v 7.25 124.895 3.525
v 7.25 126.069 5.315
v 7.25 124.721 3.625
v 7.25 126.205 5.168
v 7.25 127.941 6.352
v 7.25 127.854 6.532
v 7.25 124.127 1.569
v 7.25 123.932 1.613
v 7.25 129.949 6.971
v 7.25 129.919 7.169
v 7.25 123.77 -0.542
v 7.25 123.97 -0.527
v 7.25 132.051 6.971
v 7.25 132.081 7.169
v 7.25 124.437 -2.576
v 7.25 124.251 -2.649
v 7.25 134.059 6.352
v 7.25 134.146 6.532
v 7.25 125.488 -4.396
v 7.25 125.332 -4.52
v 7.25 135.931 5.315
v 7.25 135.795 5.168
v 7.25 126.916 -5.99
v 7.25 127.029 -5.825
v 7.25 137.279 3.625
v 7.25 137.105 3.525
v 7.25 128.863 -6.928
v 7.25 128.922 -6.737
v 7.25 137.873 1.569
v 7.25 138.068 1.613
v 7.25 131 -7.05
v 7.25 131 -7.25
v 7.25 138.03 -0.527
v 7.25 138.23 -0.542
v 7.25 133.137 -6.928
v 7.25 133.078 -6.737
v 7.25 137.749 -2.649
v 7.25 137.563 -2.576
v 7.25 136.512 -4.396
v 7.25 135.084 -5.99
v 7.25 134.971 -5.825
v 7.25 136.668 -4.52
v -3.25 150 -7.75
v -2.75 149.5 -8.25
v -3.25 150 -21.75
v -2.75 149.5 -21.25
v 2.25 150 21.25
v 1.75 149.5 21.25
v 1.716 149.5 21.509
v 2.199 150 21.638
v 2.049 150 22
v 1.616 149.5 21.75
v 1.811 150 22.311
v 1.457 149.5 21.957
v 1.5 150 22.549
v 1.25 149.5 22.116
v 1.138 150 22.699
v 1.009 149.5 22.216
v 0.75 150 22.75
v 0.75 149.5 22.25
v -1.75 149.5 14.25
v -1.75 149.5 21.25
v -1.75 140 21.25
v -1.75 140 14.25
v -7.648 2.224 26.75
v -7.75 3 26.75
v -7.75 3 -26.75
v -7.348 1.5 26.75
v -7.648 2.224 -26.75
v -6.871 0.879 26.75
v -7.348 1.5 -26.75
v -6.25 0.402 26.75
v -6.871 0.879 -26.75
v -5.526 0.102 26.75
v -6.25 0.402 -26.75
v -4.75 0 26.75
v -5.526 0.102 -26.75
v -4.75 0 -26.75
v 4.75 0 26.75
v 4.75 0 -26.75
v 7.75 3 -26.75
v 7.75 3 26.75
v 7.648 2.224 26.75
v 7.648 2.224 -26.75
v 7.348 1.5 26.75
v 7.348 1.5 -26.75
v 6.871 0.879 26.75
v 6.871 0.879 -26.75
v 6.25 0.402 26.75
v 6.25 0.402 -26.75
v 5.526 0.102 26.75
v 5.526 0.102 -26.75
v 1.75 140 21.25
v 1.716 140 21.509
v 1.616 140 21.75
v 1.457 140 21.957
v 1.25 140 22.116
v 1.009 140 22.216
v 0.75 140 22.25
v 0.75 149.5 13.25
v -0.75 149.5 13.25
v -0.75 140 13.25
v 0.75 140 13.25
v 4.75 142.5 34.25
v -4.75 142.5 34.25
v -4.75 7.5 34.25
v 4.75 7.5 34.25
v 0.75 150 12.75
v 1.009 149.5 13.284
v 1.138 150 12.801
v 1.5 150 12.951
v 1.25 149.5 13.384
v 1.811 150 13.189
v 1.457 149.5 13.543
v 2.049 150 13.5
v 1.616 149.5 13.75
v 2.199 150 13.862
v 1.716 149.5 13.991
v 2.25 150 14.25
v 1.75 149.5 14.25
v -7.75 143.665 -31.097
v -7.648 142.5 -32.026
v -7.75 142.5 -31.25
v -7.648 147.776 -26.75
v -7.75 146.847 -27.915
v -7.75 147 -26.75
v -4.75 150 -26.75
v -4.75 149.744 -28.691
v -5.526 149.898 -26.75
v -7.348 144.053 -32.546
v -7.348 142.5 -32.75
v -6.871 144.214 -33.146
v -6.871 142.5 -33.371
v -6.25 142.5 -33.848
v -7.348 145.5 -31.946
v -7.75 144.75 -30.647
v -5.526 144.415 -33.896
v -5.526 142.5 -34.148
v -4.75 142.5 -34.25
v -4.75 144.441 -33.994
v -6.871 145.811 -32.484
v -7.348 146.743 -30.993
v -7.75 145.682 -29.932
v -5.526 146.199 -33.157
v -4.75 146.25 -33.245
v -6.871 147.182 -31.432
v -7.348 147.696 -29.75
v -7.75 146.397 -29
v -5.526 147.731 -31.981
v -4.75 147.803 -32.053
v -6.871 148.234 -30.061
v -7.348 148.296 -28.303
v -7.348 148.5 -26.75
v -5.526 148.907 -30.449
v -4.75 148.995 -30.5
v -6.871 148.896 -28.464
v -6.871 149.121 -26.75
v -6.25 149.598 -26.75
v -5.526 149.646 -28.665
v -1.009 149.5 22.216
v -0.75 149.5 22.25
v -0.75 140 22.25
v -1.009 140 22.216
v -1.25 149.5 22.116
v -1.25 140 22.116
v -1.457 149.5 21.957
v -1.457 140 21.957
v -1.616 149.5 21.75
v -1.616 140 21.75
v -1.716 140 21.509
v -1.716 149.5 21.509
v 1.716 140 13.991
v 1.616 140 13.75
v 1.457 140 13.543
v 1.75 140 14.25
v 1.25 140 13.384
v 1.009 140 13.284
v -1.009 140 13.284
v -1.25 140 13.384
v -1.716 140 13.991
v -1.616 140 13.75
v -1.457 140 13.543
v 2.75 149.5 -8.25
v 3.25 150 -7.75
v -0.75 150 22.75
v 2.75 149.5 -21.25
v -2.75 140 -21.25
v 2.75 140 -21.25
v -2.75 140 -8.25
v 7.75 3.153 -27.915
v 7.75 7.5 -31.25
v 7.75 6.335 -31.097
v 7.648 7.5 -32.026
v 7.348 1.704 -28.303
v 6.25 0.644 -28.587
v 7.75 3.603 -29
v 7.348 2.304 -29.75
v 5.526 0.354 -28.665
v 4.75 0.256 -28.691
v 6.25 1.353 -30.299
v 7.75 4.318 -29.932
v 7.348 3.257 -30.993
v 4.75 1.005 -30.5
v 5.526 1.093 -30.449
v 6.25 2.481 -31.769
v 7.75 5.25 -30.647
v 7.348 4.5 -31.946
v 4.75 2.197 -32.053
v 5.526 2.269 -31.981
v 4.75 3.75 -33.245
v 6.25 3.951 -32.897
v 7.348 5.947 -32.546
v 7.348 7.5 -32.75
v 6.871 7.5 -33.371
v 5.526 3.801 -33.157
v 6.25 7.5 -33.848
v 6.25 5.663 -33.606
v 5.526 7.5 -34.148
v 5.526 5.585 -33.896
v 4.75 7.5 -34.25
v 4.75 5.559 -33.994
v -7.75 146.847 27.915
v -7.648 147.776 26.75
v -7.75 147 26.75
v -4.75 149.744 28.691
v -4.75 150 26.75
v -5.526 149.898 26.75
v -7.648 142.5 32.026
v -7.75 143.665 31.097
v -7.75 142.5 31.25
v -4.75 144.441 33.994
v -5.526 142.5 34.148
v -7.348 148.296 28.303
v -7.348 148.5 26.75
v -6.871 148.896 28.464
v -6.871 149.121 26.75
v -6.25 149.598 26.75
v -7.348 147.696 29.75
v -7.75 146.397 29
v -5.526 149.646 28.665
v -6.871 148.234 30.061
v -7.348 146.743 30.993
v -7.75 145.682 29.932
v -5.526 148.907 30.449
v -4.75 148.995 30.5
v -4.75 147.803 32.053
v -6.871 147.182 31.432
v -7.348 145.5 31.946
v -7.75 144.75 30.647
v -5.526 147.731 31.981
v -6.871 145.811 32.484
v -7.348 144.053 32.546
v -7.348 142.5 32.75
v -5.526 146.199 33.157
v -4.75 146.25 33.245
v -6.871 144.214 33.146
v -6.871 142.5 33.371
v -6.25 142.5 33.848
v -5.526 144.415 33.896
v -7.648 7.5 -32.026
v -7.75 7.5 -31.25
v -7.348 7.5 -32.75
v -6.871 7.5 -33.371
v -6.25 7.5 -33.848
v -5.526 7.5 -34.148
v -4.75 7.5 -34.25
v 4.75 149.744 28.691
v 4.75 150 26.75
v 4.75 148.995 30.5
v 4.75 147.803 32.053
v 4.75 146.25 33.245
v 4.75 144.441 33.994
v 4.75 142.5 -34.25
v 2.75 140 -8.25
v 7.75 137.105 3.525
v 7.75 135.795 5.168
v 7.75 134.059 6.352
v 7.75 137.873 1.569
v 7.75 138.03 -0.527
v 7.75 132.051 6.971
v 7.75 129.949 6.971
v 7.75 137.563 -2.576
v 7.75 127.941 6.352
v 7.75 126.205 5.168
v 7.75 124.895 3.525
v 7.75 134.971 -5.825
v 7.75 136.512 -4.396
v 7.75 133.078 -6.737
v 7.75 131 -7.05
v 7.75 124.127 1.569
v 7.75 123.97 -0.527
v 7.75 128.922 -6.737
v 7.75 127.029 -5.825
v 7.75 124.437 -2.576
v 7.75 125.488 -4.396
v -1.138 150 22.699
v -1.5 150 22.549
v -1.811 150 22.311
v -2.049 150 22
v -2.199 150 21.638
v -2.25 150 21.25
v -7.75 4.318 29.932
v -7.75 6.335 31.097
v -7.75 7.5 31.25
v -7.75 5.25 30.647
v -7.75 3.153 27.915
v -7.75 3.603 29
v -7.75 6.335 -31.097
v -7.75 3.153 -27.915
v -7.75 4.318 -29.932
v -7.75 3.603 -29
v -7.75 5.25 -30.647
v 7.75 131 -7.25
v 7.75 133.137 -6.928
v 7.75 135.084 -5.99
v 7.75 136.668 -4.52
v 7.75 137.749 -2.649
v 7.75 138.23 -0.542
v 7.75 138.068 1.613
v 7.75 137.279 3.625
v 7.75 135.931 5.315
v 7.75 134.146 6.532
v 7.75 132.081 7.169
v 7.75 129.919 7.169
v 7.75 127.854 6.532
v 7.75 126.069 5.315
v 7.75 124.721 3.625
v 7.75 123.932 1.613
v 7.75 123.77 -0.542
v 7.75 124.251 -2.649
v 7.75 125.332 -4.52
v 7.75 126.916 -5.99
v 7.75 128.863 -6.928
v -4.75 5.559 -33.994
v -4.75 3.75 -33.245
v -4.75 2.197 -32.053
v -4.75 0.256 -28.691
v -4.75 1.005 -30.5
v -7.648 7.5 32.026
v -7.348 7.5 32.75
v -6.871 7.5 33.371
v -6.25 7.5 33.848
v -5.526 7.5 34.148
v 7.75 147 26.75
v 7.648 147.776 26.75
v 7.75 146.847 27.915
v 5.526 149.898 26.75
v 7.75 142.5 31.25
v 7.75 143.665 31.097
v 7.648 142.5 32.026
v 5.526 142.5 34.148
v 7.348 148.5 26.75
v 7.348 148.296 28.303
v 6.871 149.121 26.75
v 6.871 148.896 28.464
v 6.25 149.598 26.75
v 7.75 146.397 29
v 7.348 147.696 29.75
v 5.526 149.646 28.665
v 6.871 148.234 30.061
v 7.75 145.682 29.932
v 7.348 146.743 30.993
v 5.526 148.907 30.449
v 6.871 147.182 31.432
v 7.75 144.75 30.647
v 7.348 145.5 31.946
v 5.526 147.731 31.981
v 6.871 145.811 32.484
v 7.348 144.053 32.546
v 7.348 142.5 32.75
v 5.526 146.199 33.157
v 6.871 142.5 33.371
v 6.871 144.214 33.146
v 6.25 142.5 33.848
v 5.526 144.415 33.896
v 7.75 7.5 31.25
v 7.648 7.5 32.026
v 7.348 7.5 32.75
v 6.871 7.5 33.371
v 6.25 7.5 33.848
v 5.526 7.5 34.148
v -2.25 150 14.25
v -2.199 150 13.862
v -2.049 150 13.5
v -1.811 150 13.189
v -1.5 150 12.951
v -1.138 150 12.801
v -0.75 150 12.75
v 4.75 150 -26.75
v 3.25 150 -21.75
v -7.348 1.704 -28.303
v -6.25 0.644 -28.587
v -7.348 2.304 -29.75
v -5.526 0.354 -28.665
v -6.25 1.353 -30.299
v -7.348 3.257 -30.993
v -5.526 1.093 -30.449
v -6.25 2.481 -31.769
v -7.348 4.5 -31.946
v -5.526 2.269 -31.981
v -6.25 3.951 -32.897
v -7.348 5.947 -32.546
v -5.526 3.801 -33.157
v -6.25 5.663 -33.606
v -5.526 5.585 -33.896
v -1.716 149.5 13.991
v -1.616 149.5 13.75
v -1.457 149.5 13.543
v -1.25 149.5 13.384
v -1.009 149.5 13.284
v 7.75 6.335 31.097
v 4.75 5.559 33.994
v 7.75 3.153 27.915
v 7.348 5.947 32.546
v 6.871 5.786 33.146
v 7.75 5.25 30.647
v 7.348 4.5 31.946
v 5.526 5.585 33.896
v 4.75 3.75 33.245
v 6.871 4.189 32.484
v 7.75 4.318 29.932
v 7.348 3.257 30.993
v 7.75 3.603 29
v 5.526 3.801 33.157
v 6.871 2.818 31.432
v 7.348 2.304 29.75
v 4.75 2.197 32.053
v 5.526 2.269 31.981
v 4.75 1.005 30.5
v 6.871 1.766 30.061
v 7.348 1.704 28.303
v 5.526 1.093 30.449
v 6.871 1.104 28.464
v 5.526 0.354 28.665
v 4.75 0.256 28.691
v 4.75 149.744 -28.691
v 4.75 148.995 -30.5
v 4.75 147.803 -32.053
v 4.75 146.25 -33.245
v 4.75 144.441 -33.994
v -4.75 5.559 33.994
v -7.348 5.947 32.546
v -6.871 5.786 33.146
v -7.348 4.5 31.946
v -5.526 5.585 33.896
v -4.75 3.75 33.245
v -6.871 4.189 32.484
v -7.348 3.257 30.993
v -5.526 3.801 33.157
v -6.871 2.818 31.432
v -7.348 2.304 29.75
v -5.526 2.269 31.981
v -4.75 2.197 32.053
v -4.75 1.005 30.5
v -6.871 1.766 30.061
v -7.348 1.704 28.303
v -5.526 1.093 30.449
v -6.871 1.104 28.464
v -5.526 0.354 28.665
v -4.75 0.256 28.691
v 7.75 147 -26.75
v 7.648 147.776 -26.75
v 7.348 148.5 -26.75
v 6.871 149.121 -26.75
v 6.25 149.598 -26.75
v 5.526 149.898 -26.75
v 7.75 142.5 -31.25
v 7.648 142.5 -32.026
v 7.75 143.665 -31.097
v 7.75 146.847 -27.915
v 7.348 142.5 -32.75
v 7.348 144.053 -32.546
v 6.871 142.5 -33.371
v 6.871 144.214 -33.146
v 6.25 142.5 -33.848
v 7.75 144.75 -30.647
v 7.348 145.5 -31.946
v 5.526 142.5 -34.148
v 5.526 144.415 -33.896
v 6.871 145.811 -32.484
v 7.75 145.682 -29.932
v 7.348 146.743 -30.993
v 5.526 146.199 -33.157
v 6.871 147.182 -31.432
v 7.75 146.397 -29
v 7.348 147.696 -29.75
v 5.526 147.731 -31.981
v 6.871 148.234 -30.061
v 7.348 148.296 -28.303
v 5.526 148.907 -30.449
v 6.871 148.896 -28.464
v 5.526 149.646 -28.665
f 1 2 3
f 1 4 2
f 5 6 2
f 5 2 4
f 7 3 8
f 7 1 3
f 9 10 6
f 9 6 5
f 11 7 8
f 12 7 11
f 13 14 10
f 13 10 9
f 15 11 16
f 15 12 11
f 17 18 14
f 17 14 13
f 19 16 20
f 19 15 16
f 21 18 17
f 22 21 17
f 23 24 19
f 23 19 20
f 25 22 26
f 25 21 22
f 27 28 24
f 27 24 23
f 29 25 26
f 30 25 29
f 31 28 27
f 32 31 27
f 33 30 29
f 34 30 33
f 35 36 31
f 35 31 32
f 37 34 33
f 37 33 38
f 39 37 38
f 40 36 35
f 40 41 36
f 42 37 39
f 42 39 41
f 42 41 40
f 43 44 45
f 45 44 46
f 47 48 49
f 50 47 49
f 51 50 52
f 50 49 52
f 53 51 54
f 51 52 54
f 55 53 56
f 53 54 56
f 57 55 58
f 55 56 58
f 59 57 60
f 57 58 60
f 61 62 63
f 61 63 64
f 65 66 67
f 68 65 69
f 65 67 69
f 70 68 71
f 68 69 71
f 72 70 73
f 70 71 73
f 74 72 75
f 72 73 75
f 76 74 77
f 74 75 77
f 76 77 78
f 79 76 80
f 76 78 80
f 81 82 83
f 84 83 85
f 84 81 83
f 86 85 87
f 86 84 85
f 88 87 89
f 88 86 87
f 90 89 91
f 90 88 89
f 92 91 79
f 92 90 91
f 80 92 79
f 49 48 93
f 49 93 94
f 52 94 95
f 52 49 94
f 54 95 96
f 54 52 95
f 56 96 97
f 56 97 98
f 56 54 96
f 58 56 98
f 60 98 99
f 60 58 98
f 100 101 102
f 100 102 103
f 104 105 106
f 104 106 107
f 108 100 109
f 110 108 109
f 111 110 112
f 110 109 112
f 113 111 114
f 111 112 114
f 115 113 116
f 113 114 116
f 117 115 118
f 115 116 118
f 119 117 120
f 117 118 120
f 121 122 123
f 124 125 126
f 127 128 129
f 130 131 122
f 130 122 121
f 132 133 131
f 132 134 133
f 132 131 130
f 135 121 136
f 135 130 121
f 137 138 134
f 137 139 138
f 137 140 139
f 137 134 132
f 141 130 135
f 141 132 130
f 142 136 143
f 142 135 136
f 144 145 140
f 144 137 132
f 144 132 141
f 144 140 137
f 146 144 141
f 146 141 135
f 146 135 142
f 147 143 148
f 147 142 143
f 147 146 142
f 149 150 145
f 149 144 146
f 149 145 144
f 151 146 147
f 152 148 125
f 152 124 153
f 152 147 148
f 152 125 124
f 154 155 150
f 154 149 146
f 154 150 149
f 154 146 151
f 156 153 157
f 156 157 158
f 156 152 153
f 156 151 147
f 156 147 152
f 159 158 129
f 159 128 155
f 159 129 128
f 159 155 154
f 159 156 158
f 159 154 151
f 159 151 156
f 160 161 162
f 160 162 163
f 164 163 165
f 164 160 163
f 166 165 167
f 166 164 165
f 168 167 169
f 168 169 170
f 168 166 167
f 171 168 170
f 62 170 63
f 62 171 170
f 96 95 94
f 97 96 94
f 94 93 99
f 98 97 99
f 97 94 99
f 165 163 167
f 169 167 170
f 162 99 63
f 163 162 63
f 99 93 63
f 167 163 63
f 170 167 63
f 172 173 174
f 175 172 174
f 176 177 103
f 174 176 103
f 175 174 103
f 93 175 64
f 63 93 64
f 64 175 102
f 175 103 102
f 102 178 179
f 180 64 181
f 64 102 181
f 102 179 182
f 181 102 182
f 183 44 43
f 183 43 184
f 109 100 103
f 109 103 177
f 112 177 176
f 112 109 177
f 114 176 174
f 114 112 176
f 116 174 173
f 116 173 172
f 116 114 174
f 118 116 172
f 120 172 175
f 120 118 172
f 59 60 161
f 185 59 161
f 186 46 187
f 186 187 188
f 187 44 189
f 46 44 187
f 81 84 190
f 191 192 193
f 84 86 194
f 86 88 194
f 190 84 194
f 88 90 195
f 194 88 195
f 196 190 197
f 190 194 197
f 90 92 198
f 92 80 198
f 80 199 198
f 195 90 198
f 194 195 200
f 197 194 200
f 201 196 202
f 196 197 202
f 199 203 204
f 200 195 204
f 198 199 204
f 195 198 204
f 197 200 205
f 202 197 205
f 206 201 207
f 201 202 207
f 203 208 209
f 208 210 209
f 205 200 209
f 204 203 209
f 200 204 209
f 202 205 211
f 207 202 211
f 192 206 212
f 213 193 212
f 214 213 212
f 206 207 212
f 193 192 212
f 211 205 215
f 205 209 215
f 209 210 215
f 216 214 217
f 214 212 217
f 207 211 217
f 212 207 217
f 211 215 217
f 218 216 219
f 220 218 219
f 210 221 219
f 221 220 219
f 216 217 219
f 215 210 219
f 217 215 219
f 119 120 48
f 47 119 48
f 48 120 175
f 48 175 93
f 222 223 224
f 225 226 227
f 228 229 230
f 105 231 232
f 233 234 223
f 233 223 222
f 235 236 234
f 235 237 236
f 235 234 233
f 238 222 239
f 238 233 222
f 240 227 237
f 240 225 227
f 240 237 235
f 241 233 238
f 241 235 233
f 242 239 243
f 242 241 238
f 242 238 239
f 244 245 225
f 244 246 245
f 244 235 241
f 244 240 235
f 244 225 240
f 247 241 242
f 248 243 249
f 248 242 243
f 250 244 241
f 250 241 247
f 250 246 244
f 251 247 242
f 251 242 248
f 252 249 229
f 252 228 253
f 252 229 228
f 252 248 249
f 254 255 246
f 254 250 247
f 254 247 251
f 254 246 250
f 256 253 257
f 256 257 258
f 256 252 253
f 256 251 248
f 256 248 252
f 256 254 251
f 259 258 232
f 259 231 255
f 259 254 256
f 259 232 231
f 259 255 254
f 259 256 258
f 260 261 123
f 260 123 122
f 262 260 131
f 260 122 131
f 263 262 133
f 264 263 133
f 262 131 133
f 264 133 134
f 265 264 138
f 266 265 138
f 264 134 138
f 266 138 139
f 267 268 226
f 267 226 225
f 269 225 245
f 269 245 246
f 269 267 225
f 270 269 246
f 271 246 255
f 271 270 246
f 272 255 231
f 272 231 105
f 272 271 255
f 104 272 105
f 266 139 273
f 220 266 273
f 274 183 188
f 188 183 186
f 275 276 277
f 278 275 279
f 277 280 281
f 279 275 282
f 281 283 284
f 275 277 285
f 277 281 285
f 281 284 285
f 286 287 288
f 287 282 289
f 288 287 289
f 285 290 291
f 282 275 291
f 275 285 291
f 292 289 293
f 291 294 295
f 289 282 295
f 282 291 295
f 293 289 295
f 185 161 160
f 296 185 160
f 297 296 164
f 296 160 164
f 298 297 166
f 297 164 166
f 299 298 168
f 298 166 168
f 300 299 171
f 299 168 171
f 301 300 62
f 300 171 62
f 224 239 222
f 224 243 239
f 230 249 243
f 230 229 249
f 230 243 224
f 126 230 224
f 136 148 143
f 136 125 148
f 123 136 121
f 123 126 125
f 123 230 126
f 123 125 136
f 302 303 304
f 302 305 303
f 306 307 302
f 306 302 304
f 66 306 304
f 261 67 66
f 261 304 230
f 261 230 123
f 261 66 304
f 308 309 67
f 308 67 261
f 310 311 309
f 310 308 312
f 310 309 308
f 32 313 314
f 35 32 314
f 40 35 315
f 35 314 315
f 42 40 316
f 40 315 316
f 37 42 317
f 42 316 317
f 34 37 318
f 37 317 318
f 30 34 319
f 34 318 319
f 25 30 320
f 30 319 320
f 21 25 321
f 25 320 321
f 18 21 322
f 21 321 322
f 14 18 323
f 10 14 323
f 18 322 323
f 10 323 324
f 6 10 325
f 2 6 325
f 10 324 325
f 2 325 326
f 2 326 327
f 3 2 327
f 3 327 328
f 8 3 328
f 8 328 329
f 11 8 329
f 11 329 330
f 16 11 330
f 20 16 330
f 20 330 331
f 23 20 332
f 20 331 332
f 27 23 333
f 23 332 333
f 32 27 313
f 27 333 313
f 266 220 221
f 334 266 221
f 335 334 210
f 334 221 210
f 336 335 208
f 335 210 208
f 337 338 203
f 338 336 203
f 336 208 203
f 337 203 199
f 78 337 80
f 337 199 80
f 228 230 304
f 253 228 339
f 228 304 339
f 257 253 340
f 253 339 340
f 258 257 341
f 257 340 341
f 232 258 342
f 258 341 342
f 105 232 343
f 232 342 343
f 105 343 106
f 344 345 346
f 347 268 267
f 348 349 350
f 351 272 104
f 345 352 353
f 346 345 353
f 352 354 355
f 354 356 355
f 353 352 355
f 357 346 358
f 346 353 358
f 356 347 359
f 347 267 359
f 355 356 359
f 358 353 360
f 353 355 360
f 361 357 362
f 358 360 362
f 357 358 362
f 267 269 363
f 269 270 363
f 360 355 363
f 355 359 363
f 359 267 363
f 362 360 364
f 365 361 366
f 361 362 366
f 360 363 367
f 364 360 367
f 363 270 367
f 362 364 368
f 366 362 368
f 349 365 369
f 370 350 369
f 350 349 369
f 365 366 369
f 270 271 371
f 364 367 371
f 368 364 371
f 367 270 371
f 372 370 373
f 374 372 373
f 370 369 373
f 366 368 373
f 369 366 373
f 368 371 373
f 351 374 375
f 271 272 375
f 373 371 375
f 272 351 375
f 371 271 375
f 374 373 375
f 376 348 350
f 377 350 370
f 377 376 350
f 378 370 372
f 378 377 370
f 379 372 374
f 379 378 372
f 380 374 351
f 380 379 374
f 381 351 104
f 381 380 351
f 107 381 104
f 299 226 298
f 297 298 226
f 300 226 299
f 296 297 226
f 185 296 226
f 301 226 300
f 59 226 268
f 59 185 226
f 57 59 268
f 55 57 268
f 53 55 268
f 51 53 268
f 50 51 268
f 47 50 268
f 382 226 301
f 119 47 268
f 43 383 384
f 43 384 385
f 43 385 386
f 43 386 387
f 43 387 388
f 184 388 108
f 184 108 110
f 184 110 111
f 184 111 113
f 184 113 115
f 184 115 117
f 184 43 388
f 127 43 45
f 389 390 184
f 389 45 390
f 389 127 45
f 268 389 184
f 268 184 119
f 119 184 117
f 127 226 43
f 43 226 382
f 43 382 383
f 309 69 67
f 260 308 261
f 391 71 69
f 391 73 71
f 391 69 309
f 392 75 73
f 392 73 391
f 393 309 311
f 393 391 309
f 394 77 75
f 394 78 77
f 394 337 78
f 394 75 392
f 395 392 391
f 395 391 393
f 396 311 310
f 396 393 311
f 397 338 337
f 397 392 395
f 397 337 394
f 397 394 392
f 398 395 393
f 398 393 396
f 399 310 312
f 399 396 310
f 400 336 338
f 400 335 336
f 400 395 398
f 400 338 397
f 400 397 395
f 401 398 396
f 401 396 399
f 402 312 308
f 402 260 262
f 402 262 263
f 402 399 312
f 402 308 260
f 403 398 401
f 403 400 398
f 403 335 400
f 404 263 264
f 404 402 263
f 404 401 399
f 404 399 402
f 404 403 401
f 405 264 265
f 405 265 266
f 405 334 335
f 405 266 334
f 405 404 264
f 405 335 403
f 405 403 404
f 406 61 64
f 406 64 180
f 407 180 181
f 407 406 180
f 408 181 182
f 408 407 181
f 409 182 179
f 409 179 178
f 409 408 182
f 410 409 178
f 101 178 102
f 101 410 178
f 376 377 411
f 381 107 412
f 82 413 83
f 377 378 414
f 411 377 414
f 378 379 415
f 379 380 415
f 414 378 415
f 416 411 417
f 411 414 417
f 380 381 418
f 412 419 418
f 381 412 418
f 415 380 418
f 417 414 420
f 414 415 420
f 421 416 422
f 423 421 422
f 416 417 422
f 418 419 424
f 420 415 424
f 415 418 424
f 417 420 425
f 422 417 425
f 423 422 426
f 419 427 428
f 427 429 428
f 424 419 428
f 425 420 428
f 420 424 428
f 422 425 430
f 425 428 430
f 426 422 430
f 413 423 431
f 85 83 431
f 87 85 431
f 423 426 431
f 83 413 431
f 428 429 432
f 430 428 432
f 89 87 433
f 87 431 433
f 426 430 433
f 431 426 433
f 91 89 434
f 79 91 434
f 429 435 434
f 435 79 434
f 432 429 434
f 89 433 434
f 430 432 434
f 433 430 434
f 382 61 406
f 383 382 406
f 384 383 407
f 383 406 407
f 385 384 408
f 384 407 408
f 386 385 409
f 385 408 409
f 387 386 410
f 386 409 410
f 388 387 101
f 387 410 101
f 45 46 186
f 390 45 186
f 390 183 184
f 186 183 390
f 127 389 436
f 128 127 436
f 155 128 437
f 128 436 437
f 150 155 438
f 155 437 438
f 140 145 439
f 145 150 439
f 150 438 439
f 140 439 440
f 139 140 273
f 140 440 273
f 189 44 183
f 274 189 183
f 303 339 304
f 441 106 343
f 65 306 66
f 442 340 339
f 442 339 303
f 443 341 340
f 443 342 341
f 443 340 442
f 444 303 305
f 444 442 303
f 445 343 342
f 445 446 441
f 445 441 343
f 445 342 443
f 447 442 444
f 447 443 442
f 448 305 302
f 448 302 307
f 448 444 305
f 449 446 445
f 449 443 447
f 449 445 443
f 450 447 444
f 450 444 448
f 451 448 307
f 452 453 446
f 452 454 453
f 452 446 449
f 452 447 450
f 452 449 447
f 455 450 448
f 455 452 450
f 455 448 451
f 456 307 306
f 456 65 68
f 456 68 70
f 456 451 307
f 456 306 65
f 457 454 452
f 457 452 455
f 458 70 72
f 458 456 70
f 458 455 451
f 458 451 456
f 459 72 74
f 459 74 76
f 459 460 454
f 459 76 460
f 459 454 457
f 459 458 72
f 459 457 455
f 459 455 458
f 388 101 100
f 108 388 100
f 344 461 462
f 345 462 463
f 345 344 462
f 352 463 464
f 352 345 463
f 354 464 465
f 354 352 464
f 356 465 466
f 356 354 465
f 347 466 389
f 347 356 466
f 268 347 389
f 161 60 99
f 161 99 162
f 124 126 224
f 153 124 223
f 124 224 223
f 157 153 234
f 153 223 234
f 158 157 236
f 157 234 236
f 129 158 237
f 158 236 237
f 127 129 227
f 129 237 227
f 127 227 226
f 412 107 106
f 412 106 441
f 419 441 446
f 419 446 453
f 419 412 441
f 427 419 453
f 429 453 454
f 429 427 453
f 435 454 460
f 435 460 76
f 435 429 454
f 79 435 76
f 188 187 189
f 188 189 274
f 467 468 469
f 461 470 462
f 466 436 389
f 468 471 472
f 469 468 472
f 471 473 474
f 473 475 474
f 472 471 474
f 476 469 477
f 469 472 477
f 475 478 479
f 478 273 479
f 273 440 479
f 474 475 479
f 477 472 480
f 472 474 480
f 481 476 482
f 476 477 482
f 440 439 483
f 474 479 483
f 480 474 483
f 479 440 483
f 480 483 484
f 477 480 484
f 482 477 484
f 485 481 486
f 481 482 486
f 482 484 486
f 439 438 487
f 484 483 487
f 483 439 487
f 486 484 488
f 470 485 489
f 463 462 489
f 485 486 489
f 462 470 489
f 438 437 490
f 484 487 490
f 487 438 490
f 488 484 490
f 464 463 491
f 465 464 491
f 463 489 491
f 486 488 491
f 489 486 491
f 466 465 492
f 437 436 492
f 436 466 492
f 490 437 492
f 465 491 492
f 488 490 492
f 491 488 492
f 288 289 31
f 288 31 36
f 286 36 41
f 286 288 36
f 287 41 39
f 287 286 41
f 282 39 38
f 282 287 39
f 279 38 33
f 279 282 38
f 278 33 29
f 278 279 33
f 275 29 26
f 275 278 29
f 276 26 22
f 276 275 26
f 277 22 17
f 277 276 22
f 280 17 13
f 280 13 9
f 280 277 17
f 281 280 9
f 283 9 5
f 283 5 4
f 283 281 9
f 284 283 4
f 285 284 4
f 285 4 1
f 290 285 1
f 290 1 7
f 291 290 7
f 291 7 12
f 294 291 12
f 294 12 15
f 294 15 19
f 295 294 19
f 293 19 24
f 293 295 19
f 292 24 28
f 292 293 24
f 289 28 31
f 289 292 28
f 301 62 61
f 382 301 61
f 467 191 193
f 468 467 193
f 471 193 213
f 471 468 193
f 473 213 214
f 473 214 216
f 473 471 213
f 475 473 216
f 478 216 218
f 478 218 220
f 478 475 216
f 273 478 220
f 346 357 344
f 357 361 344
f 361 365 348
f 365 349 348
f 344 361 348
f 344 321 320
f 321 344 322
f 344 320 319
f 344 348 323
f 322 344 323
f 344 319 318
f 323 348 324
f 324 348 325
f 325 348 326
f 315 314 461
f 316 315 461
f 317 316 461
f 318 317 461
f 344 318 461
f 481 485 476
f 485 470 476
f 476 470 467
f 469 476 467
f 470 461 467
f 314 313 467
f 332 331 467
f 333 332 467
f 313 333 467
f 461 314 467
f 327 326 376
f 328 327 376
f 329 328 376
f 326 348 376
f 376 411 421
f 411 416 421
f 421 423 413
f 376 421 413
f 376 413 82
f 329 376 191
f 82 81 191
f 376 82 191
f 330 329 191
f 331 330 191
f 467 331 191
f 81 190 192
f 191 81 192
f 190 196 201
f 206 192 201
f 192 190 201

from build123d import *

# Parameters (mm, degrees)
SKETCH_1_W          = 15.5
SKETCH_1_H          = 68.5
EXTRUDE_1_DEPTH     = 150
SKETCH_2_W          = 5.5
SKETCH_2_H          = 13
CUT_EXTRUDE_1_DEPTH = 10
CHAMFER_1_SIZE      = 0.5
FILLET_1_R          = 7.5
FILLET_2_R          = 3
SKETCH_3_R          = 7.25
SKETCH_3_R_2        = 7.05
CUT_EXTRUDE_2_DEPTH = 0.5


with BuildPart() as part:
    # ｽｹｯﾁ1 → ﾎﾞｽ - 押し出し1 (new body)
    with BuildSketch(Plane(origin=(0, 0, 0), x_dir=(1, 0, 0), z_dir=(0, 1, 0))):
        Rectangle(SKETCH_1_W, SKETCH_1_H)
    extrude(amount=EXTRUDE_1_DEPTH)

    # ｽｹｯﾁ2 → ｶｯﾄ - 押し出し1 (cut)
    with BuildSketch(Plane(origin=(0, 150, 0), x_dir=(1, 0, 0), z_dir=(0, 1, 0))):
        with Locations((0, 14.75)):
            Rectangle(SKETCH_2_W, SKETCH_2_H)
        with BuildLine():
            Line((-0.75, -13.25), (0.75, -13.25))
            ThreePointArc((0.75, -13.25), (1.457106781, -13.542893219), (1.75, -14.25))
            Line((1.75, -14.25), (1.75, -21.25))
            ThreePointArc((1.75, -21.25), (1.457106781, -21.957106781), (0.75, -22.25))
            Line((0.75, -22.25), (-0.75, -22.25))
            ThreePointArc((-0.75, -22.25), (-1.457106781, -21.957106781), (-1.75, -21.25))
            Line((-1.75, -21.25), (-1.75, -14.25))
            ThreePointArc((-1.75, -14.25), (-1.457106781, -13.542893219), (-0.75, -13.25))
        make_face()
    extrude(amount=-CUT_EXTRUDE_1_DEPTH, mode=Mode.SUBTRACT)

    # 面取り1
    chamfer_1_edges = [part.edges().sort_by_distance(p)[0] for p in [
        (2.75, 150, -14.75),
        (0, 150, -21.25),
        (-2.75, 150, -14.75),
        (0, 150, -8.25),
        (1.457106781, 150, 21.957106781),
        (1.75, 150, 17.75),
        (1.457106781, 150, 13.542893219),
        (0, 150, 13.25),
        (-1.457106781, 150, 13.542893219),
        (-1.75, 150, 17.75),
        (-1.457106781, 150, 21.957106781),
        (0, 150, 22.25),
    ]]
    chamfer(chamfer_1_edges, length=CHAMFER_1_SIZE)

    # ﾌｨﾚｯﾄ1
    fillet_1_edges = [part.edges().sort_by_distance(p)[0] for p in [
        (0, 150, 34.25),
        (0, 0, 34.25),
        (0, 0, -34.25),
        (0, 150, -34.25),
    ]]
    fillet(fillet_1_edges, radius=FILLET_1_R)

    # ﾌｨﾚｯﾄ2
    fillet_2_edges = [part.edges().sort_by_distance(p)[0] for p in [
        (-7.75, 75, -34.25),
        (7.75, 75, -34.25),
        (-7.75, 0, 0),
        (-7.75, 75, 34.25),
        (-7.75, 150, 0),
        (-7.75, 147.803300859, 32.053300859),
        (-7.75, 147.803300859, -32.053300859),
        (-7.75, 2.196699141, 32.053300859),
        (-7.75, 2.196699141, -32.053300859),
        (7.75, 0, 0),
        (7.75, 150, 0),
        (7.75, 75, 34.25),
        (7.75, 147.803300859, 32.053300859),
        (7.75, 147.803300859, -32.053300859),
        (7.75, 2.196699141, 32.053300859),
        (7.75, 2.196699141, -32.053300859),
    ]]
    fillet(fillet_2_edges, radius=FILLET_2_R)

    # ｽｹｯﾁ3 → ｶｯﾄ - 押し出し2 (cut)
    with BuildSketch(Plane(origin=(7.75, 0, 0), x_dir=(0, 0, -1), z_dir=(1, 0, 0))):
        with Locations((0, 131)):
            Circle(SKETCH_3_R)
        with Locations((0, 131)):
            Circle(SKETCH_3_R_2, mode=Mode.SUBTRACT)
    extrude(amount=-CUT_EXTRUDE_2_DEPTH, mode=Mode.SUBTRACT)


solid = part.part
